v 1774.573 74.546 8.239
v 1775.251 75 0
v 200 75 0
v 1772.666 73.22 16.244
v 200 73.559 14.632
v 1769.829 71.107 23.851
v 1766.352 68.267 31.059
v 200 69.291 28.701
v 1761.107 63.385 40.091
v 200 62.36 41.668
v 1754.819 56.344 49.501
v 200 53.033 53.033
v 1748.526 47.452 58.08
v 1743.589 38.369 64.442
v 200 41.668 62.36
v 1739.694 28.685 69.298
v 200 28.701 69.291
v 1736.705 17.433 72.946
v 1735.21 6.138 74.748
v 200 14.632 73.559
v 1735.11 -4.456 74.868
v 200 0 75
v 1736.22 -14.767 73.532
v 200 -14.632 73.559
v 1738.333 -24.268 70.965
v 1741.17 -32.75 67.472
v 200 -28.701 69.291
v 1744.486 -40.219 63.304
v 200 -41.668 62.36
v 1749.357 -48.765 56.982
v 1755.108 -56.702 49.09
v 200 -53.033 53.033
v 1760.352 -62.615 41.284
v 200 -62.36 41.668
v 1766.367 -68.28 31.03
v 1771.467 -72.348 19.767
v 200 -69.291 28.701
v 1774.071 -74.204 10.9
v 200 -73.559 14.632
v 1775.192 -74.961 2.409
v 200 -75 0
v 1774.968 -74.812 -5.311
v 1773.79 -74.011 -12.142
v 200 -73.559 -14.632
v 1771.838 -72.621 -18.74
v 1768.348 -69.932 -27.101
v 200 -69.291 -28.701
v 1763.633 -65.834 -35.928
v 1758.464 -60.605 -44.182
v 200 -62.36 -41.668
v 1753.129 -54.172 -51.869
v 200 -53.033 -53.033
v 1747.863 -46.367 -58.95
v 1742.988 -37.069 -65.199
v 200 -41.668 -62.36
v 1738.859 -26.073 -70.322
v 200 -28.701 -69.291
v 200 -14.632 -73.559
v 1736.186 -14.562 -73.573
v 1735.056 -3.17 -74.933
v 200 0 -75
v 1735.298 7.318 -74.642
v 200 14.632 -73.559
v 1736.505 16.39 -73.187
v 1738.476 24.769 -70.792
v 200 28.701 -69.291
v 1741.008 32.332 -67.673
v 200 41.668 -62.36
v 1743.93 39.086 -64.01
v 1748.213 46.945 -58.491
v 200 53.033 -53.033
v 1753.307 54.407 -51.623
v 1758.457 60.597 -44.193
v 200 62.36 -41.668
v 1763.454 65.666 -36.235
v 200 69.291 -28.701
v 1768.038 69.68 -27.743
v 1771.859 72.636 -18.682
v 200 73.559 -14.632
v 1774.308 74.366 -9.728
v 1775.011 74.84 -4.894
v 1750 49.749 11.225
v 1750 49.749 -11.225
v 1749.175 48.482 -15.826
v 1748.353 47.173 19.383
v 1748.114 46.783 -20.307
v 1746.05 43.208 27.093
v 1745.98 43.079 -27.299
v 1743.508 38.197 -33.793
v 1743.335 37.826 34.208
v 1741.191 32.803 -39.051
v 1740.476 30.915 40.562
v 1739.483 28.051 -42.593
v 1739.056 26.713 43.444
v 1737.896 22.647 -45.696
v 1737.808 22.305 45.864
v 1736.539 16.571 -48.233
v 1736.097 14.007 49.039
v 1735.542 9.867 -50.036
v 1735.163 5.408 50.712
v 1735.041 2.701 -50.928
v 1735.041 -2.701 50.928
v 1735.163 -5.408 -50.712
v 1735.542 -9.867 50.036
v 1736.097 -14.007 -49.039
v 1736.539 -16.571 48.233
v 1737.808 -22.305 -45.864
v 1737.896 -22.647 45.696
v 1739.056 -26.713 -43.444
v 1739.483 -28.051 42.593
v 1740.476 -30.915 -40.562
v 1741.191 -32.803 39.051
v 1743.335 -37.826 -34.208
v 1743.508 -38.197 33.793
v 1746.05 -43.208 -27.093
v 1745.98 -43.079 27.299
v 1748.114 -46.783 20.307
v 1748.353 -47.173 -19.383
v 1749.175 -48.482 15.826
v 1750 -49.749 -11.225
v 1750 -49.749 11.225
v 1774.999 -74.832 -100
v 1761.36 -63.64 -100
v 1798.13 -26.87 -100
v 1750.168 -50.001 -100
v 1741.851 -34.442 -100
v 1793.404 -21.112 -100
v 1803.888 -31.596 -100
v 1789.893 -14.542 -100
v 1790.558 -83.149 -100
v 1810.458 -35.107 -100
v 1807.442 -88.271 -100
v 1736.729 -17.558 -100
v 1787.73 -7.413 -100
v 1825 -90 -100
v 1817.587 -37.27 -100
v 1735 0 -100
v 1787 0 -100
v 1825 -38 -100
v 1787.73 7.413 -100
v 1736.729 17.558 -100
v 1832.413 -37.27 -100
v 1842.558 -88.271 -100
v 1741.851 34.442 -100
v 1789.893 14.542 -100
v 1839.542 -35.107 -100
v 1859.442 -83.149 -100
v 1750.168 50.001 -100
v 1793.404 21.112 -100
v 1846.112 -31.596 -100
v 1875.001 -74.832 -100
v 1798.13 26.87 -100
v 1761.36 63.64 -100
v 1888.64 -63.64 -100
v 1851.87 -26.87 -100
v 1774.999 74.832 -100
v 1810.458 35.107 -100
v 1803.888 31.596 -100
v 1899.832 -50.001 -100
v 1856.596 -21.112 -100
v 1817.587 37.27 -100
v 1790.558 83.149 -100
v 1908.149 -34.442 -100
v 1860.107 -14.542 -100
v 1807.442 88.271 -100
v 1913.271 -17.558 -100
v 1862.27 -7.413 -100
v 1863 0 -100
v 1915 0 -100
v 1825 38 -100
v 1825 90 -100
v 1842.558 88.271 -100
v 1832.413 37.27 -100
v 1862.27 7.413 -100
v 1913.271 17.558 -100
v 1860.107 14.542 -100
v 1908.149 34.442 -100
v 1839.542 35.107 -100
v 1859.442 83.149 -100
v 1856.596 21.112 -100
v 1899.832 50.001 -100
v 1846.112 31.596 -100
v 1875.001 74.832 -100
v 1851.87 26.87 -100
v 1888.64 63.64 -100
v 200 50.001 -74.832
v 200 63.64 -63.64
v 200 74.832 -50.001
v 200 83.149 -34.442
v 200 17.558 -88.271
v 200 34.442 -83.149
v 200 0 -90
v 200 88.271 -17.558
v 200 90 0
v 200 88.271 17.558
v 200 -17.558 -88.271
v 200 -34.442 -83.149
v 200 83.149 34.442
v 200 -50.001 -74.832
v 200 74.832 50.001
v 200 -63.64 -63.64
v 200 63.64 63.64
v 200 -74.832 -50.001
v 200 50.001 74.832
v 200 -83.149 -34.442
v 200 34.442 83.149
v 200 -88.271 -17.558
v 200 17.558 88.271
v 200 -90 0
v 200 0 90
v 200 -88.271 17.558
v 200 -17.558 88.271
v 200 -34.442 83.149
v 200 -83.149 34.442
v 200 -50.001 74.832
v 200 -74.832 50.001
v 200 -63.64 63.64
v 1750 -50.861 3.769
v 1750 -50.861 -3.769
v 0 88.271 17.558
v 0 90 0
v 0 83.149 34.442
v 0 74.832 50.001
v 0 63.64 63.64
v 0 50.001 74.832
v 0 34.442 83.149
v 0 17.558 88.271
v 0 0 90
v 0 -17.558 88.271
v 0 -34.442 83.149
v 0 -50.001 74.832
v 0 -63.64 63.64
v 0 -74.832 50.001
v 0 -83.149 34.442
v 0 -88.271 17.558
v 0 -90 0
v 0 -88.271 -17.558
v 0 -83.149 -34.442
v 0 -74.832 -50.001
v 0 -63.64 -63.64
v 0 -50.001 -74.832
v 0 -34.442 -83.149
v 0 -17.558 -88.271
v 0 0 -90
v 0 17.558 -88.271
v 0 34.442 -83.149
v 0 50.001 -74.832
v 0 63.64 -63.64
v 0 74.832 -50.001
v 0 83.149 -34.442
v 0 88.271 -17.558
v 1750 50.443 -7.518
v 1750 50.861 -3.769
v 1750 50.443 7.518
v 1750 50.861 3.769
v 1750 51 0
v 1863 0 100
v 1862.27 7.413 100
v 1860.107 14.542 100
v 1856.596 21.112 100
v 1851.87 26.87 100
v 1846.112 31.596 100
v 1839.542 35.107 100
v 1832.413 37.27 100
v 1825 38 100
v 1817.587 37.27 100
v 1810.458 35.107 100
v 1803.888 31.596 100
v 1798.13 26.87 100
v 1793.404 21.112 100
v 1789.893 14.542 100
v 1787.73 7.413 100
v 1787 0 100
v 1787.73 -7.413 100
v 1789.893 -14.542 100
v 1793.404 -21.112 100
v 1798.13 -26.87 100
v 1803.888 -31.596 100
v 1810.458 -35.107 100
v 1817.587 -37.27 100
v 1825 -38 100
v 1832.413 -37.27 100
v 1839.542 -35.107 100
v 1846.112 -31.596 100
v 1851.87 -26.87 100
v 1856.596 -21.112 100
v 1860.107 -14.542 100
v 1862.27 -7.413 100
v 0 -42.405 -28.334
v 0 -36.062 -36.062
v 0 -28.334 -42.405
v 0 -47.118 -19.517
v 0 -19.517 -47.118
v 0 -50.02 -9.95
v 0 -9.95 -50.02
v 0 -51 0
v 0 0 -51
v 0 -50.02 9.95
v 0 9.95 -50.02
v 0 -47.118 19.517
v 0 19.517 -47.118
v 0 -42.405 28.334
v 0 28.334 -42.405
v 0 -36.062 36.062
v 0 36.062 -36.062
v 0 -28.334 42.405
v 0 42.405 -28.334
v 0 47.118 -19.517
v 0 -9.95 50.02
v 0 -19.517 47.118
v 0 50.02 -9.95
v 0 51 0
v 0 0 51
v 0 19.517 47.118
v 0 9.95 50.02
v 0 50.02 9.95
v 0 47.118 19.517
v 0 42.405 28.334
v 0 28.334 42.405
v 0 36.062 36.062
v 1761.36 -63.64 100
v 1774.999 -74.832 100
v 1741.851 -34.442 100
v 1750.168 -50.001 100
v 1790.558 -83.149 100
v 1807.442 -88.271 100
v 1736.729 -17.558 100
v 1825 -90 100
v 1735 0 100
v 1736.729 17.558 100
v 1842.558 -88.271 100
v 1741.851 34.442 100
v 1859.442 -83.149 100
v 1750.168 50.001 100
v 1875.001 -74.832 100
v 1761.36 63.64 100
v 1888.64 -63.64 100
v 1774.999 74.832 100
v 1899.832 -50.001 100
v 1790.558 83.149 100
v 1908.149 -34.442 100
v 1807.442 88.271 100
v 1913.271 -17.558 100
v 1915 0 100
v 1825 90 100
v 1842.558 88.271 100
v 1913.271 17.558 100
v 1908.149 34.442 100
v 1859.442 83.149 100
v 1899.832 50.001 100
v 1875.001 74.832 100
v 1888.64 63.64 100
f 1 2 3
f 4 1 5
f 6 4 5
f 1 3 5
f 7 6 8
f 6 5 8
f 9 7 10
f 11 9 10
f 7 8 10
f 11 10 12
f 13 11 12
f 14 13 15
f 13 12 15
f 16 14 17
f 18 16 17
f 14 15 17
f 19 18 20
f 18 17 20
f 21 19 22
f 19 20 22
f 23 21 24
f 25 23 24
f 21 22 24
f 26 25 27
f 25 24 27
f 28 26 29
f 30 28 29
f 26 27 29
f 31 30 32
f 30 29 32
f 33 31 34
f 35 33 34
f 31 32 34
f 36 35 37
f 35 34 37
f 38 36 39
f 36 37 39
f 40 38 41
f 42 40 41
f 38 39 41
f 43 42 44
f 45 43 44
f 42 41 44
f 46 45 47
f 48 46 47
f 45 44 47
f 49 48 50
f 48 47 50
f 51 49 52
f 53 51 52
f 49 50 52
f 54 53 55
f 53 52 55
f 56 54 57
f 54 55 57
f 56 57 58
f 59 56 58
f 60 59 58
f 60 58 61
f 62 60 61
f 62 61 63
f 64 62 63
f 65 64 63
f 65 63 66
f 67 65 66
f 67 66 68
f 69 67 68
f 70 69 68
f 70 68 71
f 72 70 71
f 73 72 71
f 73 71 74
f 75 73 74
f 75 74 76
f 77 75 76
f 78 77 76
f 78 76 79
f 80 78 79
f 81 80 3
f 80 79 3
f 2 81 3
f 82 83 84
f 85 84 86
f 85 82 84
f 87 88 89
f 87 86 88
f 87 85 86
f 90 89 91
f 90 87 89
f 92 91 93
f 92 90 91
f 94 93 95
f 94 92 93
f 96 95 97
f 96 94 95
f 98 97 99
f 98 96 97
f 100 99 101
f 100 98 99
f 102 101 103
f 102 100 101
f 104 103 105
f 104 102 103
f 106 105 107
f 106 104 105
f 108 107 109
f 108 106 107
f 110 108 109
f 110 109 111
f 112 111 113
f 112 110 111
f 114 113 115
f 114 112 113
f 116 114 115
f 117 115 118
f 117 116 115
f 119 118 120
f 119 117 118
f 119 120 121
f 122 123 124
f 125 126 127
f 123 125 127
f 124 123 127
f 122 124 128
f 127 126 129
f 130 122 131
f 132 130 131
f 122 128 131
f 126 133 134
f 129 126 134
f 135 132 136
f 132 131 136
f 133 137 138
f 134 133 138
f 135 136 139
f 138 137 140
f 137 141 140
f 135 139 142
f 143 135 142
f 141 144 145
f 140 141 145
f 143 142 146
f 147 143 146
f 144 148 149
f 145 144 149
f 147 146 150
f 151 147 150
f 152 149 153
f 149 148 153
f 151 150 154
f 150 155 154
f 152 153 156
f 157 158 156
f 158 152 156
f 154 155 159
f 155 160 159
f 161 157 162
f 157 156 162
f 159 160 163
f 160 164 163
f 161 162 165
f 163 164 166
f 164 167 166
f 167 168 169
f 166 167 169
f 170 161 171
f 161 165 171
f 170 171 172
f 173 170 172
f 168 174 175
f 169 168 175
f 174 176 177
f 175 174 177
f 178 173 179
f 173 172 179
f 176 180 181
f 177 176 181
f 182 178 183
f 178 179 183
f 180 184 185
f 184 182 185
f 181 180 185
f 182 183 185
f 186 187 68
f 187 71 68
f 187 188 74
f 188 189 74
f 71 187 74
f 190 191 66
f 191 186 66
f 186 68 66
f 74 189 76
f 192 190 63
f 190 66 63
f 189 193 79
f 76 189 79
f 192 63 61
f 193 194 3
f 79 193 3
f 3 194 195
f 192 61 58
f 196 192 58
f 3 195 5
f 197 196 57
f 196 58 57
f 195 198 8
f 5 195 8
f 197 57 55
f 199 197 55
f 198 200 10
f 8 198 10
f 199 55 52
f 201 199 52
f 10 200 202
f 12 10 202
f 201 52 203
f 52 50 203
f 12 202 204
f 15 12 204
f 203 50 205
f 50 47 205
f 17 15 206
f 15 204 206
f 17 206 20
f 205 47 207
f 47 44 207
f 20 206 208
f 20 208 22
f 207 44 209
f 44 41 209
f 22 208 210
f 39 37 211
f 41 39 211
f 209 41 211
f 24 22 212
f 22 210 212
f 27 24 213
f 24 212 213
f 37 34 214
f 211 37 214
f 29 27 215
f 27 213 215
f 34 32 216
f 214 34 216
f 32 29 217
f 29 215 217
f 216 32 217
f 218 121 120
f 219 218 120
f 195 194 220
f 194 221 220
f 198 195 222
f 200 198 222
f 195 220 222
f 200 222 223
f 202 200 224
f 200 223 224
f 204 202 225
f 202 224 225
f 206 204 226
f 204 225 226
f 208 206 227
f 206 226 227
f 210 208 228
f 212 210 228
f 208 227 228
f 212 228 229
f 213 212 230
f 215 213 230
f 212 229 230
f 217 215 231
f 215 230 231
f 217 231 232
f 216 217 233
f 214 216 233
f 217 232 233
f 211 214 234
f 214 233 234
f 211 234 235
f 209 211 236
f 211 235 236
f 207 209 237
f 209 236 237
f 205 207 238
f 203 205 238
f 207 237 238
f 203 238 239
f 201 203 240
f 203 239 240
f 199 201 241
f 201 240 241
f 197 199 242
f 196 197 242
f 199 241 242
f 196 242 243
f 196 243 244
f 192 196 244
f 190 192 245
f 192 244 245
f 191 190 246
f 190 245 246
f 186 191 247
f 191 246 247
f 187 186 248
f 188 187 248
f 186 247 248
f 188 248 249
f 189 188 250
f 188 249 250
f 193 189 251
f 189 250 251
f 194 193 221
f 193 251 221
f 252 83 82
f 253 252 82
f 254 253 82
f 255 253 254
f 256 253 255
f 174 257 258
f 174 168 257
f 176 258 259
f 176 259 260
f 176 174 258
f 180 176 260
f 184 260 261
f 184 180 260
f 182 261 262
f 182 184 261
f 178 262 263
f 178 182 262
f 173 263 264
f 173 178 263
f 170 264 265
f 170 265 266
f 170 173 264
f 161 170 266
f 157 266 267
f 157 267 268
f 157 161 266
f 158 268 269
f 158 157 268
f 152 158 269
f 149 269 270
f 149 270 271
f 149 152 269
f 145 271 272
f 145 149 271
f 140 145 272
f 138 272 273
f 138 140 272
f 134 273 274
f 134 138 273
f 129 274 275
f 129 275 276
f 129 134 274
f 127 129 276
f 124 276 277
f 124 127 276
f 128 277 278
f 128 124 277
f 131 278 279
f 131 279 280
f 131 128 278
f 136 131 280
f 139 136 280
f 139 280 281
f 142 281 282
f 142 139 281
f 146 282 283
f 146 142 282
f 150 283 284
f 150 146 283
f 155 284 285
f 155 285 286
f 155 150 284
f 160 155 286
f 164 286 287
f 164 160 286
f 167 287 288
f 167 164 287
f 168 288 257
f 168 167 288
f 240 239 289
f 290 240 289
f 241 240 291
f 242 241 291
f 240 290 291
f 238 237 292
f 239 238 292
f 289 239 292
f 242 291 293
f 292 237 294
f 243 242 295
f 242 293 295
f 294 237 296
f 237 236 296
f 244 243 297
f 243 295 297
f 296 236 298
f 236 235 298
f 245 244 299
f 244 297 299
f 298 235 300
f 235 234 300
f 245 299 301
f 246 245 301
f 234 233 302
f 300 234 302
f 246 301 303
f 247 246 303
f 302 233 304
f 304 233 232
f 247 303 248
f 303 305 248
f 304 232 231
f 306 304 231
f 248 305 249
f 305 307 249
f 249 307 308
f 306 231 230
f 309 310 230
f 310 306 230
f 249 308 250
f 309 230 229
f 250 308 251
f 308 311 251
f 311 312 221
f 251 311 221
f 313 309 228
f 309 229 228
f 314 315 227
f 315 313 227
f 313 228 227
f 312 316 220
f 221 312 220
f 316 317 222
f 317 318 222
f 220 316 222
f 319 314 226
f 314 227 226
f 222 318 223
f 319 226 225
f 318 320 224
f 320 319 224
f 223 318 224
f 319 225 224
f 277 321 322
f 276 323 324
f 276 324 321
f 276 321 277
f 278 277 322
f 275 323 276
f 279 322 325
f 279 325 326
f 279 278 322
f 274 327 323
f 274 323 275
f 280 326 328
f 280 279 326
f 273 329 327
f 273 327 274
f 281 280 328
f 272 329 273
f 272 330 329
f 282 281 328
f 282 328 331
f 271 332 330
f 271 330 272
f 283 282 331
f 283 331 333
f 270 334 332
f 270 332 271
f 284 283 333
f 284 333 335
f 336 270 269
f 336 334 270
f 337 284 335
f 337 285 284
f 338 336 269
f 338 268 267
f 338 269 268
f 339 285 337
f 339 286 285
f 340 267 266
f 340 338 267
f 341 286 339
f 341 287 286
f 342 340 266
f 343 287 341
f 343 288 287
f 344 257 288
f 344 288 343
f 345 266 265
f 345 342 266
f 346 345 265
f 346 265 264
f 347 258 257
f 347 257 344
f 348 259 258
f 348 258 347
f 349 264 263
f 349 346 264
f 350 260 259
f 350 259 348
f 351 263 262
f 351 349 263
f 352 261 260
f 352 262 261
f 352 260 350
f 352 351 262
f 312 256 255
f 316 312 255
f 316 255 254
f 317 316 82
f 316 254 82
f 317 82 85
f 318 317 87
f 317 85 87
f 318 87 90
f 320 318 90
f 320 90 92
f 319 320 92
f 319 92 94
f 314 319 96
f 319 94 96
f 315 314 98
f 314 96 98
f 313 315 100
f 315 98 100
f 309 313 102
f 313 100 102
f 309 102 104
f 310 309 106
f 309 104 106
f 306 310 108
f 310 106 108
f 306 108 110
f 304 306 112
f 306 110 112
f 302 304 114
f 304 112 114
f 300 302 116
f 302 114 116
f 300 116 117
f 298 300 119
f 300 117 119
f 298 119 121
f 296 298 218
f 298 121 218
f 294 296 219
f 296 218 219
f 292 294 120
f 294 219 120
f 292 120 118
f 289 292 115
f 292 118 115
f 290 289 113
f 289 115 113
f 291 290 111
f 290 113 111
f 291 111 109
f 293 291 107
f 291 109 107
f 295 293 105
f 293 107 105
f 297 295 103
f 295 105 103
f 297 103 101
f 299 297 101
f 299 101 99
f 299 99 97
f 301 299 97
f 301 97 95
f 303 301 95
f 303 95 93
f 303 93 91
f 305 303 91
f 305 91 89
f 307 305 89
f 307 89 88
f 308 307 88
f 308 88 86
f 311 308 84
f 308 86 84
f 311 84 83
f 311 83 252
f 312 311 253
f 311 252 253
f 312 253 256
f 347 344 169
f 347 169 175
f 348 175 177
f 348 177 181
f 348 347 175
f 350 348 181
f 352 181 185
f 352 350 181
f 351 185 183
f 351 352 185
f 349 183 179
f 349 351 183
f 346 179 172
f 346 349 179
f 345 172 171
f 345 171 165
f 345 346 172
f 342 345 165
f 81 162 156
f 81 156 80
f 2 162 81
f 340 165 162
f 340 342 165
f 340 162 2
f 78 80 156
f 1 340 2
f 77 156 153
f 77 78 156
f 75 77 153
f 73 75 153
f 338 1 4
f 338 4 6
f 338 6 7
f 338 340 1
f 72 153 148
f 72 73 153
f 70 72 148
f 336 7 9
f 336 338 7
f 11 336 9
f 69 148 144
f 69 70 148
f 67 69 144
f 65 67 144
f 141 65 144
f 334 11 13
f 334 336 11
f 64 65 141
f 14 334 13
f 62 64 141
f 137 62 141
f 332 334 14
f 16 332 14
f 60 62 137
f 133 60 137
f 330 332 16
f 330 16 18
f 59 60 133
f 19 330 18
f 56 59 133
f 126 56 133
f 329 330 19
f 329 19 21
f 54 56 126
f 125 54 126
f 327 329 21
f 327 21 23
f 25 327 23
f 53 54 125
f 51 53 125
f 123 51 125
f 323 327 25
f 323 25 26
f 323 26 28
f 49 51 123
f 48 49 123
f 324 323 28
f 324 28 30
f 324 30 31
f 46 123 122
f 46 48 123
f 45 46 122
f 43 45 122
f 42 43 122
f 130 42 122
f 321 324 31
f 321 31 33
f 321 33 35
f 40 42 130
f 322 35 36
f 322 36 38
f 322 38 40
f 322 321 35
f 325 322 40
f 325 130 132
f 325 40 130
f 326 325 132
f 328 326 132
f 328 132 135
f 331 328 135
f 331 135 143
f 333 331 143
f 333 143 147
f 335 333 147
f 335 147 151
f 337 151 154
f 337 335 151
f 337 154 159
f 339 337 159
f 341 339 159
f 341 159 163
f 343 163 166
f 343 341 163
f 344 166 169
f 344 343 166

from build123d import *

# Parameters (mm, degrees)
SKETCH2_R               = 90
SKETCH2_R_2             = 38
BOSS_EXTRUDE1_DEPTH     = 100
CUT_EXTRUDE1_DEPTH      = 1920.720031781
CUT_EXTRUDE1_DEPTH_BACK = 1920.720031781
SKETCH2_2_R             = 38


with BuildPart() as part:
    # Sketch1 → Revolve2 (revolve)
    with BuildSketch(Plane.XY):
        Polygon((1825, 0), (1825, 75), (200, 75), (200, 90), (0, 90), (0, 51), (1750, 51), (1750, 0), align=None)
    revolve(axis=Axis((0, 0, 0), (1, 0, 0)))

    # Sketch2 → Boss-Extrude1 (add, symmetric)
    with BuildSketch(Plane.XY):
        with Locations((1825, 0)):
            Circle(SKETCH2_R)
        with Locations((1825, 0)):
            Circle(SKETCH2_R_2, mode=Mode.SUBTRACT)
    extrude(amount=BOSS_EXTRUDE1_DEPTH, both=True)

    # Sketch2<2> → Cut-Extrude1 (cut, two sides: drawn at the far end of the back side and taken through both)
    with BuildSketch(Plane.XY.offset(-CUT_EXTRUDE1_DEPTH_BACK)):
        with Locations((1825, 0)):
            Circle(SKETCH2_2_R)
    extrude(amount=CUT_EXTRUDE1_DEPTH + CUT_EXTRUDE1_DEPTH_BACK, mode=Mode.SUBTRACT)


solid = part.part
